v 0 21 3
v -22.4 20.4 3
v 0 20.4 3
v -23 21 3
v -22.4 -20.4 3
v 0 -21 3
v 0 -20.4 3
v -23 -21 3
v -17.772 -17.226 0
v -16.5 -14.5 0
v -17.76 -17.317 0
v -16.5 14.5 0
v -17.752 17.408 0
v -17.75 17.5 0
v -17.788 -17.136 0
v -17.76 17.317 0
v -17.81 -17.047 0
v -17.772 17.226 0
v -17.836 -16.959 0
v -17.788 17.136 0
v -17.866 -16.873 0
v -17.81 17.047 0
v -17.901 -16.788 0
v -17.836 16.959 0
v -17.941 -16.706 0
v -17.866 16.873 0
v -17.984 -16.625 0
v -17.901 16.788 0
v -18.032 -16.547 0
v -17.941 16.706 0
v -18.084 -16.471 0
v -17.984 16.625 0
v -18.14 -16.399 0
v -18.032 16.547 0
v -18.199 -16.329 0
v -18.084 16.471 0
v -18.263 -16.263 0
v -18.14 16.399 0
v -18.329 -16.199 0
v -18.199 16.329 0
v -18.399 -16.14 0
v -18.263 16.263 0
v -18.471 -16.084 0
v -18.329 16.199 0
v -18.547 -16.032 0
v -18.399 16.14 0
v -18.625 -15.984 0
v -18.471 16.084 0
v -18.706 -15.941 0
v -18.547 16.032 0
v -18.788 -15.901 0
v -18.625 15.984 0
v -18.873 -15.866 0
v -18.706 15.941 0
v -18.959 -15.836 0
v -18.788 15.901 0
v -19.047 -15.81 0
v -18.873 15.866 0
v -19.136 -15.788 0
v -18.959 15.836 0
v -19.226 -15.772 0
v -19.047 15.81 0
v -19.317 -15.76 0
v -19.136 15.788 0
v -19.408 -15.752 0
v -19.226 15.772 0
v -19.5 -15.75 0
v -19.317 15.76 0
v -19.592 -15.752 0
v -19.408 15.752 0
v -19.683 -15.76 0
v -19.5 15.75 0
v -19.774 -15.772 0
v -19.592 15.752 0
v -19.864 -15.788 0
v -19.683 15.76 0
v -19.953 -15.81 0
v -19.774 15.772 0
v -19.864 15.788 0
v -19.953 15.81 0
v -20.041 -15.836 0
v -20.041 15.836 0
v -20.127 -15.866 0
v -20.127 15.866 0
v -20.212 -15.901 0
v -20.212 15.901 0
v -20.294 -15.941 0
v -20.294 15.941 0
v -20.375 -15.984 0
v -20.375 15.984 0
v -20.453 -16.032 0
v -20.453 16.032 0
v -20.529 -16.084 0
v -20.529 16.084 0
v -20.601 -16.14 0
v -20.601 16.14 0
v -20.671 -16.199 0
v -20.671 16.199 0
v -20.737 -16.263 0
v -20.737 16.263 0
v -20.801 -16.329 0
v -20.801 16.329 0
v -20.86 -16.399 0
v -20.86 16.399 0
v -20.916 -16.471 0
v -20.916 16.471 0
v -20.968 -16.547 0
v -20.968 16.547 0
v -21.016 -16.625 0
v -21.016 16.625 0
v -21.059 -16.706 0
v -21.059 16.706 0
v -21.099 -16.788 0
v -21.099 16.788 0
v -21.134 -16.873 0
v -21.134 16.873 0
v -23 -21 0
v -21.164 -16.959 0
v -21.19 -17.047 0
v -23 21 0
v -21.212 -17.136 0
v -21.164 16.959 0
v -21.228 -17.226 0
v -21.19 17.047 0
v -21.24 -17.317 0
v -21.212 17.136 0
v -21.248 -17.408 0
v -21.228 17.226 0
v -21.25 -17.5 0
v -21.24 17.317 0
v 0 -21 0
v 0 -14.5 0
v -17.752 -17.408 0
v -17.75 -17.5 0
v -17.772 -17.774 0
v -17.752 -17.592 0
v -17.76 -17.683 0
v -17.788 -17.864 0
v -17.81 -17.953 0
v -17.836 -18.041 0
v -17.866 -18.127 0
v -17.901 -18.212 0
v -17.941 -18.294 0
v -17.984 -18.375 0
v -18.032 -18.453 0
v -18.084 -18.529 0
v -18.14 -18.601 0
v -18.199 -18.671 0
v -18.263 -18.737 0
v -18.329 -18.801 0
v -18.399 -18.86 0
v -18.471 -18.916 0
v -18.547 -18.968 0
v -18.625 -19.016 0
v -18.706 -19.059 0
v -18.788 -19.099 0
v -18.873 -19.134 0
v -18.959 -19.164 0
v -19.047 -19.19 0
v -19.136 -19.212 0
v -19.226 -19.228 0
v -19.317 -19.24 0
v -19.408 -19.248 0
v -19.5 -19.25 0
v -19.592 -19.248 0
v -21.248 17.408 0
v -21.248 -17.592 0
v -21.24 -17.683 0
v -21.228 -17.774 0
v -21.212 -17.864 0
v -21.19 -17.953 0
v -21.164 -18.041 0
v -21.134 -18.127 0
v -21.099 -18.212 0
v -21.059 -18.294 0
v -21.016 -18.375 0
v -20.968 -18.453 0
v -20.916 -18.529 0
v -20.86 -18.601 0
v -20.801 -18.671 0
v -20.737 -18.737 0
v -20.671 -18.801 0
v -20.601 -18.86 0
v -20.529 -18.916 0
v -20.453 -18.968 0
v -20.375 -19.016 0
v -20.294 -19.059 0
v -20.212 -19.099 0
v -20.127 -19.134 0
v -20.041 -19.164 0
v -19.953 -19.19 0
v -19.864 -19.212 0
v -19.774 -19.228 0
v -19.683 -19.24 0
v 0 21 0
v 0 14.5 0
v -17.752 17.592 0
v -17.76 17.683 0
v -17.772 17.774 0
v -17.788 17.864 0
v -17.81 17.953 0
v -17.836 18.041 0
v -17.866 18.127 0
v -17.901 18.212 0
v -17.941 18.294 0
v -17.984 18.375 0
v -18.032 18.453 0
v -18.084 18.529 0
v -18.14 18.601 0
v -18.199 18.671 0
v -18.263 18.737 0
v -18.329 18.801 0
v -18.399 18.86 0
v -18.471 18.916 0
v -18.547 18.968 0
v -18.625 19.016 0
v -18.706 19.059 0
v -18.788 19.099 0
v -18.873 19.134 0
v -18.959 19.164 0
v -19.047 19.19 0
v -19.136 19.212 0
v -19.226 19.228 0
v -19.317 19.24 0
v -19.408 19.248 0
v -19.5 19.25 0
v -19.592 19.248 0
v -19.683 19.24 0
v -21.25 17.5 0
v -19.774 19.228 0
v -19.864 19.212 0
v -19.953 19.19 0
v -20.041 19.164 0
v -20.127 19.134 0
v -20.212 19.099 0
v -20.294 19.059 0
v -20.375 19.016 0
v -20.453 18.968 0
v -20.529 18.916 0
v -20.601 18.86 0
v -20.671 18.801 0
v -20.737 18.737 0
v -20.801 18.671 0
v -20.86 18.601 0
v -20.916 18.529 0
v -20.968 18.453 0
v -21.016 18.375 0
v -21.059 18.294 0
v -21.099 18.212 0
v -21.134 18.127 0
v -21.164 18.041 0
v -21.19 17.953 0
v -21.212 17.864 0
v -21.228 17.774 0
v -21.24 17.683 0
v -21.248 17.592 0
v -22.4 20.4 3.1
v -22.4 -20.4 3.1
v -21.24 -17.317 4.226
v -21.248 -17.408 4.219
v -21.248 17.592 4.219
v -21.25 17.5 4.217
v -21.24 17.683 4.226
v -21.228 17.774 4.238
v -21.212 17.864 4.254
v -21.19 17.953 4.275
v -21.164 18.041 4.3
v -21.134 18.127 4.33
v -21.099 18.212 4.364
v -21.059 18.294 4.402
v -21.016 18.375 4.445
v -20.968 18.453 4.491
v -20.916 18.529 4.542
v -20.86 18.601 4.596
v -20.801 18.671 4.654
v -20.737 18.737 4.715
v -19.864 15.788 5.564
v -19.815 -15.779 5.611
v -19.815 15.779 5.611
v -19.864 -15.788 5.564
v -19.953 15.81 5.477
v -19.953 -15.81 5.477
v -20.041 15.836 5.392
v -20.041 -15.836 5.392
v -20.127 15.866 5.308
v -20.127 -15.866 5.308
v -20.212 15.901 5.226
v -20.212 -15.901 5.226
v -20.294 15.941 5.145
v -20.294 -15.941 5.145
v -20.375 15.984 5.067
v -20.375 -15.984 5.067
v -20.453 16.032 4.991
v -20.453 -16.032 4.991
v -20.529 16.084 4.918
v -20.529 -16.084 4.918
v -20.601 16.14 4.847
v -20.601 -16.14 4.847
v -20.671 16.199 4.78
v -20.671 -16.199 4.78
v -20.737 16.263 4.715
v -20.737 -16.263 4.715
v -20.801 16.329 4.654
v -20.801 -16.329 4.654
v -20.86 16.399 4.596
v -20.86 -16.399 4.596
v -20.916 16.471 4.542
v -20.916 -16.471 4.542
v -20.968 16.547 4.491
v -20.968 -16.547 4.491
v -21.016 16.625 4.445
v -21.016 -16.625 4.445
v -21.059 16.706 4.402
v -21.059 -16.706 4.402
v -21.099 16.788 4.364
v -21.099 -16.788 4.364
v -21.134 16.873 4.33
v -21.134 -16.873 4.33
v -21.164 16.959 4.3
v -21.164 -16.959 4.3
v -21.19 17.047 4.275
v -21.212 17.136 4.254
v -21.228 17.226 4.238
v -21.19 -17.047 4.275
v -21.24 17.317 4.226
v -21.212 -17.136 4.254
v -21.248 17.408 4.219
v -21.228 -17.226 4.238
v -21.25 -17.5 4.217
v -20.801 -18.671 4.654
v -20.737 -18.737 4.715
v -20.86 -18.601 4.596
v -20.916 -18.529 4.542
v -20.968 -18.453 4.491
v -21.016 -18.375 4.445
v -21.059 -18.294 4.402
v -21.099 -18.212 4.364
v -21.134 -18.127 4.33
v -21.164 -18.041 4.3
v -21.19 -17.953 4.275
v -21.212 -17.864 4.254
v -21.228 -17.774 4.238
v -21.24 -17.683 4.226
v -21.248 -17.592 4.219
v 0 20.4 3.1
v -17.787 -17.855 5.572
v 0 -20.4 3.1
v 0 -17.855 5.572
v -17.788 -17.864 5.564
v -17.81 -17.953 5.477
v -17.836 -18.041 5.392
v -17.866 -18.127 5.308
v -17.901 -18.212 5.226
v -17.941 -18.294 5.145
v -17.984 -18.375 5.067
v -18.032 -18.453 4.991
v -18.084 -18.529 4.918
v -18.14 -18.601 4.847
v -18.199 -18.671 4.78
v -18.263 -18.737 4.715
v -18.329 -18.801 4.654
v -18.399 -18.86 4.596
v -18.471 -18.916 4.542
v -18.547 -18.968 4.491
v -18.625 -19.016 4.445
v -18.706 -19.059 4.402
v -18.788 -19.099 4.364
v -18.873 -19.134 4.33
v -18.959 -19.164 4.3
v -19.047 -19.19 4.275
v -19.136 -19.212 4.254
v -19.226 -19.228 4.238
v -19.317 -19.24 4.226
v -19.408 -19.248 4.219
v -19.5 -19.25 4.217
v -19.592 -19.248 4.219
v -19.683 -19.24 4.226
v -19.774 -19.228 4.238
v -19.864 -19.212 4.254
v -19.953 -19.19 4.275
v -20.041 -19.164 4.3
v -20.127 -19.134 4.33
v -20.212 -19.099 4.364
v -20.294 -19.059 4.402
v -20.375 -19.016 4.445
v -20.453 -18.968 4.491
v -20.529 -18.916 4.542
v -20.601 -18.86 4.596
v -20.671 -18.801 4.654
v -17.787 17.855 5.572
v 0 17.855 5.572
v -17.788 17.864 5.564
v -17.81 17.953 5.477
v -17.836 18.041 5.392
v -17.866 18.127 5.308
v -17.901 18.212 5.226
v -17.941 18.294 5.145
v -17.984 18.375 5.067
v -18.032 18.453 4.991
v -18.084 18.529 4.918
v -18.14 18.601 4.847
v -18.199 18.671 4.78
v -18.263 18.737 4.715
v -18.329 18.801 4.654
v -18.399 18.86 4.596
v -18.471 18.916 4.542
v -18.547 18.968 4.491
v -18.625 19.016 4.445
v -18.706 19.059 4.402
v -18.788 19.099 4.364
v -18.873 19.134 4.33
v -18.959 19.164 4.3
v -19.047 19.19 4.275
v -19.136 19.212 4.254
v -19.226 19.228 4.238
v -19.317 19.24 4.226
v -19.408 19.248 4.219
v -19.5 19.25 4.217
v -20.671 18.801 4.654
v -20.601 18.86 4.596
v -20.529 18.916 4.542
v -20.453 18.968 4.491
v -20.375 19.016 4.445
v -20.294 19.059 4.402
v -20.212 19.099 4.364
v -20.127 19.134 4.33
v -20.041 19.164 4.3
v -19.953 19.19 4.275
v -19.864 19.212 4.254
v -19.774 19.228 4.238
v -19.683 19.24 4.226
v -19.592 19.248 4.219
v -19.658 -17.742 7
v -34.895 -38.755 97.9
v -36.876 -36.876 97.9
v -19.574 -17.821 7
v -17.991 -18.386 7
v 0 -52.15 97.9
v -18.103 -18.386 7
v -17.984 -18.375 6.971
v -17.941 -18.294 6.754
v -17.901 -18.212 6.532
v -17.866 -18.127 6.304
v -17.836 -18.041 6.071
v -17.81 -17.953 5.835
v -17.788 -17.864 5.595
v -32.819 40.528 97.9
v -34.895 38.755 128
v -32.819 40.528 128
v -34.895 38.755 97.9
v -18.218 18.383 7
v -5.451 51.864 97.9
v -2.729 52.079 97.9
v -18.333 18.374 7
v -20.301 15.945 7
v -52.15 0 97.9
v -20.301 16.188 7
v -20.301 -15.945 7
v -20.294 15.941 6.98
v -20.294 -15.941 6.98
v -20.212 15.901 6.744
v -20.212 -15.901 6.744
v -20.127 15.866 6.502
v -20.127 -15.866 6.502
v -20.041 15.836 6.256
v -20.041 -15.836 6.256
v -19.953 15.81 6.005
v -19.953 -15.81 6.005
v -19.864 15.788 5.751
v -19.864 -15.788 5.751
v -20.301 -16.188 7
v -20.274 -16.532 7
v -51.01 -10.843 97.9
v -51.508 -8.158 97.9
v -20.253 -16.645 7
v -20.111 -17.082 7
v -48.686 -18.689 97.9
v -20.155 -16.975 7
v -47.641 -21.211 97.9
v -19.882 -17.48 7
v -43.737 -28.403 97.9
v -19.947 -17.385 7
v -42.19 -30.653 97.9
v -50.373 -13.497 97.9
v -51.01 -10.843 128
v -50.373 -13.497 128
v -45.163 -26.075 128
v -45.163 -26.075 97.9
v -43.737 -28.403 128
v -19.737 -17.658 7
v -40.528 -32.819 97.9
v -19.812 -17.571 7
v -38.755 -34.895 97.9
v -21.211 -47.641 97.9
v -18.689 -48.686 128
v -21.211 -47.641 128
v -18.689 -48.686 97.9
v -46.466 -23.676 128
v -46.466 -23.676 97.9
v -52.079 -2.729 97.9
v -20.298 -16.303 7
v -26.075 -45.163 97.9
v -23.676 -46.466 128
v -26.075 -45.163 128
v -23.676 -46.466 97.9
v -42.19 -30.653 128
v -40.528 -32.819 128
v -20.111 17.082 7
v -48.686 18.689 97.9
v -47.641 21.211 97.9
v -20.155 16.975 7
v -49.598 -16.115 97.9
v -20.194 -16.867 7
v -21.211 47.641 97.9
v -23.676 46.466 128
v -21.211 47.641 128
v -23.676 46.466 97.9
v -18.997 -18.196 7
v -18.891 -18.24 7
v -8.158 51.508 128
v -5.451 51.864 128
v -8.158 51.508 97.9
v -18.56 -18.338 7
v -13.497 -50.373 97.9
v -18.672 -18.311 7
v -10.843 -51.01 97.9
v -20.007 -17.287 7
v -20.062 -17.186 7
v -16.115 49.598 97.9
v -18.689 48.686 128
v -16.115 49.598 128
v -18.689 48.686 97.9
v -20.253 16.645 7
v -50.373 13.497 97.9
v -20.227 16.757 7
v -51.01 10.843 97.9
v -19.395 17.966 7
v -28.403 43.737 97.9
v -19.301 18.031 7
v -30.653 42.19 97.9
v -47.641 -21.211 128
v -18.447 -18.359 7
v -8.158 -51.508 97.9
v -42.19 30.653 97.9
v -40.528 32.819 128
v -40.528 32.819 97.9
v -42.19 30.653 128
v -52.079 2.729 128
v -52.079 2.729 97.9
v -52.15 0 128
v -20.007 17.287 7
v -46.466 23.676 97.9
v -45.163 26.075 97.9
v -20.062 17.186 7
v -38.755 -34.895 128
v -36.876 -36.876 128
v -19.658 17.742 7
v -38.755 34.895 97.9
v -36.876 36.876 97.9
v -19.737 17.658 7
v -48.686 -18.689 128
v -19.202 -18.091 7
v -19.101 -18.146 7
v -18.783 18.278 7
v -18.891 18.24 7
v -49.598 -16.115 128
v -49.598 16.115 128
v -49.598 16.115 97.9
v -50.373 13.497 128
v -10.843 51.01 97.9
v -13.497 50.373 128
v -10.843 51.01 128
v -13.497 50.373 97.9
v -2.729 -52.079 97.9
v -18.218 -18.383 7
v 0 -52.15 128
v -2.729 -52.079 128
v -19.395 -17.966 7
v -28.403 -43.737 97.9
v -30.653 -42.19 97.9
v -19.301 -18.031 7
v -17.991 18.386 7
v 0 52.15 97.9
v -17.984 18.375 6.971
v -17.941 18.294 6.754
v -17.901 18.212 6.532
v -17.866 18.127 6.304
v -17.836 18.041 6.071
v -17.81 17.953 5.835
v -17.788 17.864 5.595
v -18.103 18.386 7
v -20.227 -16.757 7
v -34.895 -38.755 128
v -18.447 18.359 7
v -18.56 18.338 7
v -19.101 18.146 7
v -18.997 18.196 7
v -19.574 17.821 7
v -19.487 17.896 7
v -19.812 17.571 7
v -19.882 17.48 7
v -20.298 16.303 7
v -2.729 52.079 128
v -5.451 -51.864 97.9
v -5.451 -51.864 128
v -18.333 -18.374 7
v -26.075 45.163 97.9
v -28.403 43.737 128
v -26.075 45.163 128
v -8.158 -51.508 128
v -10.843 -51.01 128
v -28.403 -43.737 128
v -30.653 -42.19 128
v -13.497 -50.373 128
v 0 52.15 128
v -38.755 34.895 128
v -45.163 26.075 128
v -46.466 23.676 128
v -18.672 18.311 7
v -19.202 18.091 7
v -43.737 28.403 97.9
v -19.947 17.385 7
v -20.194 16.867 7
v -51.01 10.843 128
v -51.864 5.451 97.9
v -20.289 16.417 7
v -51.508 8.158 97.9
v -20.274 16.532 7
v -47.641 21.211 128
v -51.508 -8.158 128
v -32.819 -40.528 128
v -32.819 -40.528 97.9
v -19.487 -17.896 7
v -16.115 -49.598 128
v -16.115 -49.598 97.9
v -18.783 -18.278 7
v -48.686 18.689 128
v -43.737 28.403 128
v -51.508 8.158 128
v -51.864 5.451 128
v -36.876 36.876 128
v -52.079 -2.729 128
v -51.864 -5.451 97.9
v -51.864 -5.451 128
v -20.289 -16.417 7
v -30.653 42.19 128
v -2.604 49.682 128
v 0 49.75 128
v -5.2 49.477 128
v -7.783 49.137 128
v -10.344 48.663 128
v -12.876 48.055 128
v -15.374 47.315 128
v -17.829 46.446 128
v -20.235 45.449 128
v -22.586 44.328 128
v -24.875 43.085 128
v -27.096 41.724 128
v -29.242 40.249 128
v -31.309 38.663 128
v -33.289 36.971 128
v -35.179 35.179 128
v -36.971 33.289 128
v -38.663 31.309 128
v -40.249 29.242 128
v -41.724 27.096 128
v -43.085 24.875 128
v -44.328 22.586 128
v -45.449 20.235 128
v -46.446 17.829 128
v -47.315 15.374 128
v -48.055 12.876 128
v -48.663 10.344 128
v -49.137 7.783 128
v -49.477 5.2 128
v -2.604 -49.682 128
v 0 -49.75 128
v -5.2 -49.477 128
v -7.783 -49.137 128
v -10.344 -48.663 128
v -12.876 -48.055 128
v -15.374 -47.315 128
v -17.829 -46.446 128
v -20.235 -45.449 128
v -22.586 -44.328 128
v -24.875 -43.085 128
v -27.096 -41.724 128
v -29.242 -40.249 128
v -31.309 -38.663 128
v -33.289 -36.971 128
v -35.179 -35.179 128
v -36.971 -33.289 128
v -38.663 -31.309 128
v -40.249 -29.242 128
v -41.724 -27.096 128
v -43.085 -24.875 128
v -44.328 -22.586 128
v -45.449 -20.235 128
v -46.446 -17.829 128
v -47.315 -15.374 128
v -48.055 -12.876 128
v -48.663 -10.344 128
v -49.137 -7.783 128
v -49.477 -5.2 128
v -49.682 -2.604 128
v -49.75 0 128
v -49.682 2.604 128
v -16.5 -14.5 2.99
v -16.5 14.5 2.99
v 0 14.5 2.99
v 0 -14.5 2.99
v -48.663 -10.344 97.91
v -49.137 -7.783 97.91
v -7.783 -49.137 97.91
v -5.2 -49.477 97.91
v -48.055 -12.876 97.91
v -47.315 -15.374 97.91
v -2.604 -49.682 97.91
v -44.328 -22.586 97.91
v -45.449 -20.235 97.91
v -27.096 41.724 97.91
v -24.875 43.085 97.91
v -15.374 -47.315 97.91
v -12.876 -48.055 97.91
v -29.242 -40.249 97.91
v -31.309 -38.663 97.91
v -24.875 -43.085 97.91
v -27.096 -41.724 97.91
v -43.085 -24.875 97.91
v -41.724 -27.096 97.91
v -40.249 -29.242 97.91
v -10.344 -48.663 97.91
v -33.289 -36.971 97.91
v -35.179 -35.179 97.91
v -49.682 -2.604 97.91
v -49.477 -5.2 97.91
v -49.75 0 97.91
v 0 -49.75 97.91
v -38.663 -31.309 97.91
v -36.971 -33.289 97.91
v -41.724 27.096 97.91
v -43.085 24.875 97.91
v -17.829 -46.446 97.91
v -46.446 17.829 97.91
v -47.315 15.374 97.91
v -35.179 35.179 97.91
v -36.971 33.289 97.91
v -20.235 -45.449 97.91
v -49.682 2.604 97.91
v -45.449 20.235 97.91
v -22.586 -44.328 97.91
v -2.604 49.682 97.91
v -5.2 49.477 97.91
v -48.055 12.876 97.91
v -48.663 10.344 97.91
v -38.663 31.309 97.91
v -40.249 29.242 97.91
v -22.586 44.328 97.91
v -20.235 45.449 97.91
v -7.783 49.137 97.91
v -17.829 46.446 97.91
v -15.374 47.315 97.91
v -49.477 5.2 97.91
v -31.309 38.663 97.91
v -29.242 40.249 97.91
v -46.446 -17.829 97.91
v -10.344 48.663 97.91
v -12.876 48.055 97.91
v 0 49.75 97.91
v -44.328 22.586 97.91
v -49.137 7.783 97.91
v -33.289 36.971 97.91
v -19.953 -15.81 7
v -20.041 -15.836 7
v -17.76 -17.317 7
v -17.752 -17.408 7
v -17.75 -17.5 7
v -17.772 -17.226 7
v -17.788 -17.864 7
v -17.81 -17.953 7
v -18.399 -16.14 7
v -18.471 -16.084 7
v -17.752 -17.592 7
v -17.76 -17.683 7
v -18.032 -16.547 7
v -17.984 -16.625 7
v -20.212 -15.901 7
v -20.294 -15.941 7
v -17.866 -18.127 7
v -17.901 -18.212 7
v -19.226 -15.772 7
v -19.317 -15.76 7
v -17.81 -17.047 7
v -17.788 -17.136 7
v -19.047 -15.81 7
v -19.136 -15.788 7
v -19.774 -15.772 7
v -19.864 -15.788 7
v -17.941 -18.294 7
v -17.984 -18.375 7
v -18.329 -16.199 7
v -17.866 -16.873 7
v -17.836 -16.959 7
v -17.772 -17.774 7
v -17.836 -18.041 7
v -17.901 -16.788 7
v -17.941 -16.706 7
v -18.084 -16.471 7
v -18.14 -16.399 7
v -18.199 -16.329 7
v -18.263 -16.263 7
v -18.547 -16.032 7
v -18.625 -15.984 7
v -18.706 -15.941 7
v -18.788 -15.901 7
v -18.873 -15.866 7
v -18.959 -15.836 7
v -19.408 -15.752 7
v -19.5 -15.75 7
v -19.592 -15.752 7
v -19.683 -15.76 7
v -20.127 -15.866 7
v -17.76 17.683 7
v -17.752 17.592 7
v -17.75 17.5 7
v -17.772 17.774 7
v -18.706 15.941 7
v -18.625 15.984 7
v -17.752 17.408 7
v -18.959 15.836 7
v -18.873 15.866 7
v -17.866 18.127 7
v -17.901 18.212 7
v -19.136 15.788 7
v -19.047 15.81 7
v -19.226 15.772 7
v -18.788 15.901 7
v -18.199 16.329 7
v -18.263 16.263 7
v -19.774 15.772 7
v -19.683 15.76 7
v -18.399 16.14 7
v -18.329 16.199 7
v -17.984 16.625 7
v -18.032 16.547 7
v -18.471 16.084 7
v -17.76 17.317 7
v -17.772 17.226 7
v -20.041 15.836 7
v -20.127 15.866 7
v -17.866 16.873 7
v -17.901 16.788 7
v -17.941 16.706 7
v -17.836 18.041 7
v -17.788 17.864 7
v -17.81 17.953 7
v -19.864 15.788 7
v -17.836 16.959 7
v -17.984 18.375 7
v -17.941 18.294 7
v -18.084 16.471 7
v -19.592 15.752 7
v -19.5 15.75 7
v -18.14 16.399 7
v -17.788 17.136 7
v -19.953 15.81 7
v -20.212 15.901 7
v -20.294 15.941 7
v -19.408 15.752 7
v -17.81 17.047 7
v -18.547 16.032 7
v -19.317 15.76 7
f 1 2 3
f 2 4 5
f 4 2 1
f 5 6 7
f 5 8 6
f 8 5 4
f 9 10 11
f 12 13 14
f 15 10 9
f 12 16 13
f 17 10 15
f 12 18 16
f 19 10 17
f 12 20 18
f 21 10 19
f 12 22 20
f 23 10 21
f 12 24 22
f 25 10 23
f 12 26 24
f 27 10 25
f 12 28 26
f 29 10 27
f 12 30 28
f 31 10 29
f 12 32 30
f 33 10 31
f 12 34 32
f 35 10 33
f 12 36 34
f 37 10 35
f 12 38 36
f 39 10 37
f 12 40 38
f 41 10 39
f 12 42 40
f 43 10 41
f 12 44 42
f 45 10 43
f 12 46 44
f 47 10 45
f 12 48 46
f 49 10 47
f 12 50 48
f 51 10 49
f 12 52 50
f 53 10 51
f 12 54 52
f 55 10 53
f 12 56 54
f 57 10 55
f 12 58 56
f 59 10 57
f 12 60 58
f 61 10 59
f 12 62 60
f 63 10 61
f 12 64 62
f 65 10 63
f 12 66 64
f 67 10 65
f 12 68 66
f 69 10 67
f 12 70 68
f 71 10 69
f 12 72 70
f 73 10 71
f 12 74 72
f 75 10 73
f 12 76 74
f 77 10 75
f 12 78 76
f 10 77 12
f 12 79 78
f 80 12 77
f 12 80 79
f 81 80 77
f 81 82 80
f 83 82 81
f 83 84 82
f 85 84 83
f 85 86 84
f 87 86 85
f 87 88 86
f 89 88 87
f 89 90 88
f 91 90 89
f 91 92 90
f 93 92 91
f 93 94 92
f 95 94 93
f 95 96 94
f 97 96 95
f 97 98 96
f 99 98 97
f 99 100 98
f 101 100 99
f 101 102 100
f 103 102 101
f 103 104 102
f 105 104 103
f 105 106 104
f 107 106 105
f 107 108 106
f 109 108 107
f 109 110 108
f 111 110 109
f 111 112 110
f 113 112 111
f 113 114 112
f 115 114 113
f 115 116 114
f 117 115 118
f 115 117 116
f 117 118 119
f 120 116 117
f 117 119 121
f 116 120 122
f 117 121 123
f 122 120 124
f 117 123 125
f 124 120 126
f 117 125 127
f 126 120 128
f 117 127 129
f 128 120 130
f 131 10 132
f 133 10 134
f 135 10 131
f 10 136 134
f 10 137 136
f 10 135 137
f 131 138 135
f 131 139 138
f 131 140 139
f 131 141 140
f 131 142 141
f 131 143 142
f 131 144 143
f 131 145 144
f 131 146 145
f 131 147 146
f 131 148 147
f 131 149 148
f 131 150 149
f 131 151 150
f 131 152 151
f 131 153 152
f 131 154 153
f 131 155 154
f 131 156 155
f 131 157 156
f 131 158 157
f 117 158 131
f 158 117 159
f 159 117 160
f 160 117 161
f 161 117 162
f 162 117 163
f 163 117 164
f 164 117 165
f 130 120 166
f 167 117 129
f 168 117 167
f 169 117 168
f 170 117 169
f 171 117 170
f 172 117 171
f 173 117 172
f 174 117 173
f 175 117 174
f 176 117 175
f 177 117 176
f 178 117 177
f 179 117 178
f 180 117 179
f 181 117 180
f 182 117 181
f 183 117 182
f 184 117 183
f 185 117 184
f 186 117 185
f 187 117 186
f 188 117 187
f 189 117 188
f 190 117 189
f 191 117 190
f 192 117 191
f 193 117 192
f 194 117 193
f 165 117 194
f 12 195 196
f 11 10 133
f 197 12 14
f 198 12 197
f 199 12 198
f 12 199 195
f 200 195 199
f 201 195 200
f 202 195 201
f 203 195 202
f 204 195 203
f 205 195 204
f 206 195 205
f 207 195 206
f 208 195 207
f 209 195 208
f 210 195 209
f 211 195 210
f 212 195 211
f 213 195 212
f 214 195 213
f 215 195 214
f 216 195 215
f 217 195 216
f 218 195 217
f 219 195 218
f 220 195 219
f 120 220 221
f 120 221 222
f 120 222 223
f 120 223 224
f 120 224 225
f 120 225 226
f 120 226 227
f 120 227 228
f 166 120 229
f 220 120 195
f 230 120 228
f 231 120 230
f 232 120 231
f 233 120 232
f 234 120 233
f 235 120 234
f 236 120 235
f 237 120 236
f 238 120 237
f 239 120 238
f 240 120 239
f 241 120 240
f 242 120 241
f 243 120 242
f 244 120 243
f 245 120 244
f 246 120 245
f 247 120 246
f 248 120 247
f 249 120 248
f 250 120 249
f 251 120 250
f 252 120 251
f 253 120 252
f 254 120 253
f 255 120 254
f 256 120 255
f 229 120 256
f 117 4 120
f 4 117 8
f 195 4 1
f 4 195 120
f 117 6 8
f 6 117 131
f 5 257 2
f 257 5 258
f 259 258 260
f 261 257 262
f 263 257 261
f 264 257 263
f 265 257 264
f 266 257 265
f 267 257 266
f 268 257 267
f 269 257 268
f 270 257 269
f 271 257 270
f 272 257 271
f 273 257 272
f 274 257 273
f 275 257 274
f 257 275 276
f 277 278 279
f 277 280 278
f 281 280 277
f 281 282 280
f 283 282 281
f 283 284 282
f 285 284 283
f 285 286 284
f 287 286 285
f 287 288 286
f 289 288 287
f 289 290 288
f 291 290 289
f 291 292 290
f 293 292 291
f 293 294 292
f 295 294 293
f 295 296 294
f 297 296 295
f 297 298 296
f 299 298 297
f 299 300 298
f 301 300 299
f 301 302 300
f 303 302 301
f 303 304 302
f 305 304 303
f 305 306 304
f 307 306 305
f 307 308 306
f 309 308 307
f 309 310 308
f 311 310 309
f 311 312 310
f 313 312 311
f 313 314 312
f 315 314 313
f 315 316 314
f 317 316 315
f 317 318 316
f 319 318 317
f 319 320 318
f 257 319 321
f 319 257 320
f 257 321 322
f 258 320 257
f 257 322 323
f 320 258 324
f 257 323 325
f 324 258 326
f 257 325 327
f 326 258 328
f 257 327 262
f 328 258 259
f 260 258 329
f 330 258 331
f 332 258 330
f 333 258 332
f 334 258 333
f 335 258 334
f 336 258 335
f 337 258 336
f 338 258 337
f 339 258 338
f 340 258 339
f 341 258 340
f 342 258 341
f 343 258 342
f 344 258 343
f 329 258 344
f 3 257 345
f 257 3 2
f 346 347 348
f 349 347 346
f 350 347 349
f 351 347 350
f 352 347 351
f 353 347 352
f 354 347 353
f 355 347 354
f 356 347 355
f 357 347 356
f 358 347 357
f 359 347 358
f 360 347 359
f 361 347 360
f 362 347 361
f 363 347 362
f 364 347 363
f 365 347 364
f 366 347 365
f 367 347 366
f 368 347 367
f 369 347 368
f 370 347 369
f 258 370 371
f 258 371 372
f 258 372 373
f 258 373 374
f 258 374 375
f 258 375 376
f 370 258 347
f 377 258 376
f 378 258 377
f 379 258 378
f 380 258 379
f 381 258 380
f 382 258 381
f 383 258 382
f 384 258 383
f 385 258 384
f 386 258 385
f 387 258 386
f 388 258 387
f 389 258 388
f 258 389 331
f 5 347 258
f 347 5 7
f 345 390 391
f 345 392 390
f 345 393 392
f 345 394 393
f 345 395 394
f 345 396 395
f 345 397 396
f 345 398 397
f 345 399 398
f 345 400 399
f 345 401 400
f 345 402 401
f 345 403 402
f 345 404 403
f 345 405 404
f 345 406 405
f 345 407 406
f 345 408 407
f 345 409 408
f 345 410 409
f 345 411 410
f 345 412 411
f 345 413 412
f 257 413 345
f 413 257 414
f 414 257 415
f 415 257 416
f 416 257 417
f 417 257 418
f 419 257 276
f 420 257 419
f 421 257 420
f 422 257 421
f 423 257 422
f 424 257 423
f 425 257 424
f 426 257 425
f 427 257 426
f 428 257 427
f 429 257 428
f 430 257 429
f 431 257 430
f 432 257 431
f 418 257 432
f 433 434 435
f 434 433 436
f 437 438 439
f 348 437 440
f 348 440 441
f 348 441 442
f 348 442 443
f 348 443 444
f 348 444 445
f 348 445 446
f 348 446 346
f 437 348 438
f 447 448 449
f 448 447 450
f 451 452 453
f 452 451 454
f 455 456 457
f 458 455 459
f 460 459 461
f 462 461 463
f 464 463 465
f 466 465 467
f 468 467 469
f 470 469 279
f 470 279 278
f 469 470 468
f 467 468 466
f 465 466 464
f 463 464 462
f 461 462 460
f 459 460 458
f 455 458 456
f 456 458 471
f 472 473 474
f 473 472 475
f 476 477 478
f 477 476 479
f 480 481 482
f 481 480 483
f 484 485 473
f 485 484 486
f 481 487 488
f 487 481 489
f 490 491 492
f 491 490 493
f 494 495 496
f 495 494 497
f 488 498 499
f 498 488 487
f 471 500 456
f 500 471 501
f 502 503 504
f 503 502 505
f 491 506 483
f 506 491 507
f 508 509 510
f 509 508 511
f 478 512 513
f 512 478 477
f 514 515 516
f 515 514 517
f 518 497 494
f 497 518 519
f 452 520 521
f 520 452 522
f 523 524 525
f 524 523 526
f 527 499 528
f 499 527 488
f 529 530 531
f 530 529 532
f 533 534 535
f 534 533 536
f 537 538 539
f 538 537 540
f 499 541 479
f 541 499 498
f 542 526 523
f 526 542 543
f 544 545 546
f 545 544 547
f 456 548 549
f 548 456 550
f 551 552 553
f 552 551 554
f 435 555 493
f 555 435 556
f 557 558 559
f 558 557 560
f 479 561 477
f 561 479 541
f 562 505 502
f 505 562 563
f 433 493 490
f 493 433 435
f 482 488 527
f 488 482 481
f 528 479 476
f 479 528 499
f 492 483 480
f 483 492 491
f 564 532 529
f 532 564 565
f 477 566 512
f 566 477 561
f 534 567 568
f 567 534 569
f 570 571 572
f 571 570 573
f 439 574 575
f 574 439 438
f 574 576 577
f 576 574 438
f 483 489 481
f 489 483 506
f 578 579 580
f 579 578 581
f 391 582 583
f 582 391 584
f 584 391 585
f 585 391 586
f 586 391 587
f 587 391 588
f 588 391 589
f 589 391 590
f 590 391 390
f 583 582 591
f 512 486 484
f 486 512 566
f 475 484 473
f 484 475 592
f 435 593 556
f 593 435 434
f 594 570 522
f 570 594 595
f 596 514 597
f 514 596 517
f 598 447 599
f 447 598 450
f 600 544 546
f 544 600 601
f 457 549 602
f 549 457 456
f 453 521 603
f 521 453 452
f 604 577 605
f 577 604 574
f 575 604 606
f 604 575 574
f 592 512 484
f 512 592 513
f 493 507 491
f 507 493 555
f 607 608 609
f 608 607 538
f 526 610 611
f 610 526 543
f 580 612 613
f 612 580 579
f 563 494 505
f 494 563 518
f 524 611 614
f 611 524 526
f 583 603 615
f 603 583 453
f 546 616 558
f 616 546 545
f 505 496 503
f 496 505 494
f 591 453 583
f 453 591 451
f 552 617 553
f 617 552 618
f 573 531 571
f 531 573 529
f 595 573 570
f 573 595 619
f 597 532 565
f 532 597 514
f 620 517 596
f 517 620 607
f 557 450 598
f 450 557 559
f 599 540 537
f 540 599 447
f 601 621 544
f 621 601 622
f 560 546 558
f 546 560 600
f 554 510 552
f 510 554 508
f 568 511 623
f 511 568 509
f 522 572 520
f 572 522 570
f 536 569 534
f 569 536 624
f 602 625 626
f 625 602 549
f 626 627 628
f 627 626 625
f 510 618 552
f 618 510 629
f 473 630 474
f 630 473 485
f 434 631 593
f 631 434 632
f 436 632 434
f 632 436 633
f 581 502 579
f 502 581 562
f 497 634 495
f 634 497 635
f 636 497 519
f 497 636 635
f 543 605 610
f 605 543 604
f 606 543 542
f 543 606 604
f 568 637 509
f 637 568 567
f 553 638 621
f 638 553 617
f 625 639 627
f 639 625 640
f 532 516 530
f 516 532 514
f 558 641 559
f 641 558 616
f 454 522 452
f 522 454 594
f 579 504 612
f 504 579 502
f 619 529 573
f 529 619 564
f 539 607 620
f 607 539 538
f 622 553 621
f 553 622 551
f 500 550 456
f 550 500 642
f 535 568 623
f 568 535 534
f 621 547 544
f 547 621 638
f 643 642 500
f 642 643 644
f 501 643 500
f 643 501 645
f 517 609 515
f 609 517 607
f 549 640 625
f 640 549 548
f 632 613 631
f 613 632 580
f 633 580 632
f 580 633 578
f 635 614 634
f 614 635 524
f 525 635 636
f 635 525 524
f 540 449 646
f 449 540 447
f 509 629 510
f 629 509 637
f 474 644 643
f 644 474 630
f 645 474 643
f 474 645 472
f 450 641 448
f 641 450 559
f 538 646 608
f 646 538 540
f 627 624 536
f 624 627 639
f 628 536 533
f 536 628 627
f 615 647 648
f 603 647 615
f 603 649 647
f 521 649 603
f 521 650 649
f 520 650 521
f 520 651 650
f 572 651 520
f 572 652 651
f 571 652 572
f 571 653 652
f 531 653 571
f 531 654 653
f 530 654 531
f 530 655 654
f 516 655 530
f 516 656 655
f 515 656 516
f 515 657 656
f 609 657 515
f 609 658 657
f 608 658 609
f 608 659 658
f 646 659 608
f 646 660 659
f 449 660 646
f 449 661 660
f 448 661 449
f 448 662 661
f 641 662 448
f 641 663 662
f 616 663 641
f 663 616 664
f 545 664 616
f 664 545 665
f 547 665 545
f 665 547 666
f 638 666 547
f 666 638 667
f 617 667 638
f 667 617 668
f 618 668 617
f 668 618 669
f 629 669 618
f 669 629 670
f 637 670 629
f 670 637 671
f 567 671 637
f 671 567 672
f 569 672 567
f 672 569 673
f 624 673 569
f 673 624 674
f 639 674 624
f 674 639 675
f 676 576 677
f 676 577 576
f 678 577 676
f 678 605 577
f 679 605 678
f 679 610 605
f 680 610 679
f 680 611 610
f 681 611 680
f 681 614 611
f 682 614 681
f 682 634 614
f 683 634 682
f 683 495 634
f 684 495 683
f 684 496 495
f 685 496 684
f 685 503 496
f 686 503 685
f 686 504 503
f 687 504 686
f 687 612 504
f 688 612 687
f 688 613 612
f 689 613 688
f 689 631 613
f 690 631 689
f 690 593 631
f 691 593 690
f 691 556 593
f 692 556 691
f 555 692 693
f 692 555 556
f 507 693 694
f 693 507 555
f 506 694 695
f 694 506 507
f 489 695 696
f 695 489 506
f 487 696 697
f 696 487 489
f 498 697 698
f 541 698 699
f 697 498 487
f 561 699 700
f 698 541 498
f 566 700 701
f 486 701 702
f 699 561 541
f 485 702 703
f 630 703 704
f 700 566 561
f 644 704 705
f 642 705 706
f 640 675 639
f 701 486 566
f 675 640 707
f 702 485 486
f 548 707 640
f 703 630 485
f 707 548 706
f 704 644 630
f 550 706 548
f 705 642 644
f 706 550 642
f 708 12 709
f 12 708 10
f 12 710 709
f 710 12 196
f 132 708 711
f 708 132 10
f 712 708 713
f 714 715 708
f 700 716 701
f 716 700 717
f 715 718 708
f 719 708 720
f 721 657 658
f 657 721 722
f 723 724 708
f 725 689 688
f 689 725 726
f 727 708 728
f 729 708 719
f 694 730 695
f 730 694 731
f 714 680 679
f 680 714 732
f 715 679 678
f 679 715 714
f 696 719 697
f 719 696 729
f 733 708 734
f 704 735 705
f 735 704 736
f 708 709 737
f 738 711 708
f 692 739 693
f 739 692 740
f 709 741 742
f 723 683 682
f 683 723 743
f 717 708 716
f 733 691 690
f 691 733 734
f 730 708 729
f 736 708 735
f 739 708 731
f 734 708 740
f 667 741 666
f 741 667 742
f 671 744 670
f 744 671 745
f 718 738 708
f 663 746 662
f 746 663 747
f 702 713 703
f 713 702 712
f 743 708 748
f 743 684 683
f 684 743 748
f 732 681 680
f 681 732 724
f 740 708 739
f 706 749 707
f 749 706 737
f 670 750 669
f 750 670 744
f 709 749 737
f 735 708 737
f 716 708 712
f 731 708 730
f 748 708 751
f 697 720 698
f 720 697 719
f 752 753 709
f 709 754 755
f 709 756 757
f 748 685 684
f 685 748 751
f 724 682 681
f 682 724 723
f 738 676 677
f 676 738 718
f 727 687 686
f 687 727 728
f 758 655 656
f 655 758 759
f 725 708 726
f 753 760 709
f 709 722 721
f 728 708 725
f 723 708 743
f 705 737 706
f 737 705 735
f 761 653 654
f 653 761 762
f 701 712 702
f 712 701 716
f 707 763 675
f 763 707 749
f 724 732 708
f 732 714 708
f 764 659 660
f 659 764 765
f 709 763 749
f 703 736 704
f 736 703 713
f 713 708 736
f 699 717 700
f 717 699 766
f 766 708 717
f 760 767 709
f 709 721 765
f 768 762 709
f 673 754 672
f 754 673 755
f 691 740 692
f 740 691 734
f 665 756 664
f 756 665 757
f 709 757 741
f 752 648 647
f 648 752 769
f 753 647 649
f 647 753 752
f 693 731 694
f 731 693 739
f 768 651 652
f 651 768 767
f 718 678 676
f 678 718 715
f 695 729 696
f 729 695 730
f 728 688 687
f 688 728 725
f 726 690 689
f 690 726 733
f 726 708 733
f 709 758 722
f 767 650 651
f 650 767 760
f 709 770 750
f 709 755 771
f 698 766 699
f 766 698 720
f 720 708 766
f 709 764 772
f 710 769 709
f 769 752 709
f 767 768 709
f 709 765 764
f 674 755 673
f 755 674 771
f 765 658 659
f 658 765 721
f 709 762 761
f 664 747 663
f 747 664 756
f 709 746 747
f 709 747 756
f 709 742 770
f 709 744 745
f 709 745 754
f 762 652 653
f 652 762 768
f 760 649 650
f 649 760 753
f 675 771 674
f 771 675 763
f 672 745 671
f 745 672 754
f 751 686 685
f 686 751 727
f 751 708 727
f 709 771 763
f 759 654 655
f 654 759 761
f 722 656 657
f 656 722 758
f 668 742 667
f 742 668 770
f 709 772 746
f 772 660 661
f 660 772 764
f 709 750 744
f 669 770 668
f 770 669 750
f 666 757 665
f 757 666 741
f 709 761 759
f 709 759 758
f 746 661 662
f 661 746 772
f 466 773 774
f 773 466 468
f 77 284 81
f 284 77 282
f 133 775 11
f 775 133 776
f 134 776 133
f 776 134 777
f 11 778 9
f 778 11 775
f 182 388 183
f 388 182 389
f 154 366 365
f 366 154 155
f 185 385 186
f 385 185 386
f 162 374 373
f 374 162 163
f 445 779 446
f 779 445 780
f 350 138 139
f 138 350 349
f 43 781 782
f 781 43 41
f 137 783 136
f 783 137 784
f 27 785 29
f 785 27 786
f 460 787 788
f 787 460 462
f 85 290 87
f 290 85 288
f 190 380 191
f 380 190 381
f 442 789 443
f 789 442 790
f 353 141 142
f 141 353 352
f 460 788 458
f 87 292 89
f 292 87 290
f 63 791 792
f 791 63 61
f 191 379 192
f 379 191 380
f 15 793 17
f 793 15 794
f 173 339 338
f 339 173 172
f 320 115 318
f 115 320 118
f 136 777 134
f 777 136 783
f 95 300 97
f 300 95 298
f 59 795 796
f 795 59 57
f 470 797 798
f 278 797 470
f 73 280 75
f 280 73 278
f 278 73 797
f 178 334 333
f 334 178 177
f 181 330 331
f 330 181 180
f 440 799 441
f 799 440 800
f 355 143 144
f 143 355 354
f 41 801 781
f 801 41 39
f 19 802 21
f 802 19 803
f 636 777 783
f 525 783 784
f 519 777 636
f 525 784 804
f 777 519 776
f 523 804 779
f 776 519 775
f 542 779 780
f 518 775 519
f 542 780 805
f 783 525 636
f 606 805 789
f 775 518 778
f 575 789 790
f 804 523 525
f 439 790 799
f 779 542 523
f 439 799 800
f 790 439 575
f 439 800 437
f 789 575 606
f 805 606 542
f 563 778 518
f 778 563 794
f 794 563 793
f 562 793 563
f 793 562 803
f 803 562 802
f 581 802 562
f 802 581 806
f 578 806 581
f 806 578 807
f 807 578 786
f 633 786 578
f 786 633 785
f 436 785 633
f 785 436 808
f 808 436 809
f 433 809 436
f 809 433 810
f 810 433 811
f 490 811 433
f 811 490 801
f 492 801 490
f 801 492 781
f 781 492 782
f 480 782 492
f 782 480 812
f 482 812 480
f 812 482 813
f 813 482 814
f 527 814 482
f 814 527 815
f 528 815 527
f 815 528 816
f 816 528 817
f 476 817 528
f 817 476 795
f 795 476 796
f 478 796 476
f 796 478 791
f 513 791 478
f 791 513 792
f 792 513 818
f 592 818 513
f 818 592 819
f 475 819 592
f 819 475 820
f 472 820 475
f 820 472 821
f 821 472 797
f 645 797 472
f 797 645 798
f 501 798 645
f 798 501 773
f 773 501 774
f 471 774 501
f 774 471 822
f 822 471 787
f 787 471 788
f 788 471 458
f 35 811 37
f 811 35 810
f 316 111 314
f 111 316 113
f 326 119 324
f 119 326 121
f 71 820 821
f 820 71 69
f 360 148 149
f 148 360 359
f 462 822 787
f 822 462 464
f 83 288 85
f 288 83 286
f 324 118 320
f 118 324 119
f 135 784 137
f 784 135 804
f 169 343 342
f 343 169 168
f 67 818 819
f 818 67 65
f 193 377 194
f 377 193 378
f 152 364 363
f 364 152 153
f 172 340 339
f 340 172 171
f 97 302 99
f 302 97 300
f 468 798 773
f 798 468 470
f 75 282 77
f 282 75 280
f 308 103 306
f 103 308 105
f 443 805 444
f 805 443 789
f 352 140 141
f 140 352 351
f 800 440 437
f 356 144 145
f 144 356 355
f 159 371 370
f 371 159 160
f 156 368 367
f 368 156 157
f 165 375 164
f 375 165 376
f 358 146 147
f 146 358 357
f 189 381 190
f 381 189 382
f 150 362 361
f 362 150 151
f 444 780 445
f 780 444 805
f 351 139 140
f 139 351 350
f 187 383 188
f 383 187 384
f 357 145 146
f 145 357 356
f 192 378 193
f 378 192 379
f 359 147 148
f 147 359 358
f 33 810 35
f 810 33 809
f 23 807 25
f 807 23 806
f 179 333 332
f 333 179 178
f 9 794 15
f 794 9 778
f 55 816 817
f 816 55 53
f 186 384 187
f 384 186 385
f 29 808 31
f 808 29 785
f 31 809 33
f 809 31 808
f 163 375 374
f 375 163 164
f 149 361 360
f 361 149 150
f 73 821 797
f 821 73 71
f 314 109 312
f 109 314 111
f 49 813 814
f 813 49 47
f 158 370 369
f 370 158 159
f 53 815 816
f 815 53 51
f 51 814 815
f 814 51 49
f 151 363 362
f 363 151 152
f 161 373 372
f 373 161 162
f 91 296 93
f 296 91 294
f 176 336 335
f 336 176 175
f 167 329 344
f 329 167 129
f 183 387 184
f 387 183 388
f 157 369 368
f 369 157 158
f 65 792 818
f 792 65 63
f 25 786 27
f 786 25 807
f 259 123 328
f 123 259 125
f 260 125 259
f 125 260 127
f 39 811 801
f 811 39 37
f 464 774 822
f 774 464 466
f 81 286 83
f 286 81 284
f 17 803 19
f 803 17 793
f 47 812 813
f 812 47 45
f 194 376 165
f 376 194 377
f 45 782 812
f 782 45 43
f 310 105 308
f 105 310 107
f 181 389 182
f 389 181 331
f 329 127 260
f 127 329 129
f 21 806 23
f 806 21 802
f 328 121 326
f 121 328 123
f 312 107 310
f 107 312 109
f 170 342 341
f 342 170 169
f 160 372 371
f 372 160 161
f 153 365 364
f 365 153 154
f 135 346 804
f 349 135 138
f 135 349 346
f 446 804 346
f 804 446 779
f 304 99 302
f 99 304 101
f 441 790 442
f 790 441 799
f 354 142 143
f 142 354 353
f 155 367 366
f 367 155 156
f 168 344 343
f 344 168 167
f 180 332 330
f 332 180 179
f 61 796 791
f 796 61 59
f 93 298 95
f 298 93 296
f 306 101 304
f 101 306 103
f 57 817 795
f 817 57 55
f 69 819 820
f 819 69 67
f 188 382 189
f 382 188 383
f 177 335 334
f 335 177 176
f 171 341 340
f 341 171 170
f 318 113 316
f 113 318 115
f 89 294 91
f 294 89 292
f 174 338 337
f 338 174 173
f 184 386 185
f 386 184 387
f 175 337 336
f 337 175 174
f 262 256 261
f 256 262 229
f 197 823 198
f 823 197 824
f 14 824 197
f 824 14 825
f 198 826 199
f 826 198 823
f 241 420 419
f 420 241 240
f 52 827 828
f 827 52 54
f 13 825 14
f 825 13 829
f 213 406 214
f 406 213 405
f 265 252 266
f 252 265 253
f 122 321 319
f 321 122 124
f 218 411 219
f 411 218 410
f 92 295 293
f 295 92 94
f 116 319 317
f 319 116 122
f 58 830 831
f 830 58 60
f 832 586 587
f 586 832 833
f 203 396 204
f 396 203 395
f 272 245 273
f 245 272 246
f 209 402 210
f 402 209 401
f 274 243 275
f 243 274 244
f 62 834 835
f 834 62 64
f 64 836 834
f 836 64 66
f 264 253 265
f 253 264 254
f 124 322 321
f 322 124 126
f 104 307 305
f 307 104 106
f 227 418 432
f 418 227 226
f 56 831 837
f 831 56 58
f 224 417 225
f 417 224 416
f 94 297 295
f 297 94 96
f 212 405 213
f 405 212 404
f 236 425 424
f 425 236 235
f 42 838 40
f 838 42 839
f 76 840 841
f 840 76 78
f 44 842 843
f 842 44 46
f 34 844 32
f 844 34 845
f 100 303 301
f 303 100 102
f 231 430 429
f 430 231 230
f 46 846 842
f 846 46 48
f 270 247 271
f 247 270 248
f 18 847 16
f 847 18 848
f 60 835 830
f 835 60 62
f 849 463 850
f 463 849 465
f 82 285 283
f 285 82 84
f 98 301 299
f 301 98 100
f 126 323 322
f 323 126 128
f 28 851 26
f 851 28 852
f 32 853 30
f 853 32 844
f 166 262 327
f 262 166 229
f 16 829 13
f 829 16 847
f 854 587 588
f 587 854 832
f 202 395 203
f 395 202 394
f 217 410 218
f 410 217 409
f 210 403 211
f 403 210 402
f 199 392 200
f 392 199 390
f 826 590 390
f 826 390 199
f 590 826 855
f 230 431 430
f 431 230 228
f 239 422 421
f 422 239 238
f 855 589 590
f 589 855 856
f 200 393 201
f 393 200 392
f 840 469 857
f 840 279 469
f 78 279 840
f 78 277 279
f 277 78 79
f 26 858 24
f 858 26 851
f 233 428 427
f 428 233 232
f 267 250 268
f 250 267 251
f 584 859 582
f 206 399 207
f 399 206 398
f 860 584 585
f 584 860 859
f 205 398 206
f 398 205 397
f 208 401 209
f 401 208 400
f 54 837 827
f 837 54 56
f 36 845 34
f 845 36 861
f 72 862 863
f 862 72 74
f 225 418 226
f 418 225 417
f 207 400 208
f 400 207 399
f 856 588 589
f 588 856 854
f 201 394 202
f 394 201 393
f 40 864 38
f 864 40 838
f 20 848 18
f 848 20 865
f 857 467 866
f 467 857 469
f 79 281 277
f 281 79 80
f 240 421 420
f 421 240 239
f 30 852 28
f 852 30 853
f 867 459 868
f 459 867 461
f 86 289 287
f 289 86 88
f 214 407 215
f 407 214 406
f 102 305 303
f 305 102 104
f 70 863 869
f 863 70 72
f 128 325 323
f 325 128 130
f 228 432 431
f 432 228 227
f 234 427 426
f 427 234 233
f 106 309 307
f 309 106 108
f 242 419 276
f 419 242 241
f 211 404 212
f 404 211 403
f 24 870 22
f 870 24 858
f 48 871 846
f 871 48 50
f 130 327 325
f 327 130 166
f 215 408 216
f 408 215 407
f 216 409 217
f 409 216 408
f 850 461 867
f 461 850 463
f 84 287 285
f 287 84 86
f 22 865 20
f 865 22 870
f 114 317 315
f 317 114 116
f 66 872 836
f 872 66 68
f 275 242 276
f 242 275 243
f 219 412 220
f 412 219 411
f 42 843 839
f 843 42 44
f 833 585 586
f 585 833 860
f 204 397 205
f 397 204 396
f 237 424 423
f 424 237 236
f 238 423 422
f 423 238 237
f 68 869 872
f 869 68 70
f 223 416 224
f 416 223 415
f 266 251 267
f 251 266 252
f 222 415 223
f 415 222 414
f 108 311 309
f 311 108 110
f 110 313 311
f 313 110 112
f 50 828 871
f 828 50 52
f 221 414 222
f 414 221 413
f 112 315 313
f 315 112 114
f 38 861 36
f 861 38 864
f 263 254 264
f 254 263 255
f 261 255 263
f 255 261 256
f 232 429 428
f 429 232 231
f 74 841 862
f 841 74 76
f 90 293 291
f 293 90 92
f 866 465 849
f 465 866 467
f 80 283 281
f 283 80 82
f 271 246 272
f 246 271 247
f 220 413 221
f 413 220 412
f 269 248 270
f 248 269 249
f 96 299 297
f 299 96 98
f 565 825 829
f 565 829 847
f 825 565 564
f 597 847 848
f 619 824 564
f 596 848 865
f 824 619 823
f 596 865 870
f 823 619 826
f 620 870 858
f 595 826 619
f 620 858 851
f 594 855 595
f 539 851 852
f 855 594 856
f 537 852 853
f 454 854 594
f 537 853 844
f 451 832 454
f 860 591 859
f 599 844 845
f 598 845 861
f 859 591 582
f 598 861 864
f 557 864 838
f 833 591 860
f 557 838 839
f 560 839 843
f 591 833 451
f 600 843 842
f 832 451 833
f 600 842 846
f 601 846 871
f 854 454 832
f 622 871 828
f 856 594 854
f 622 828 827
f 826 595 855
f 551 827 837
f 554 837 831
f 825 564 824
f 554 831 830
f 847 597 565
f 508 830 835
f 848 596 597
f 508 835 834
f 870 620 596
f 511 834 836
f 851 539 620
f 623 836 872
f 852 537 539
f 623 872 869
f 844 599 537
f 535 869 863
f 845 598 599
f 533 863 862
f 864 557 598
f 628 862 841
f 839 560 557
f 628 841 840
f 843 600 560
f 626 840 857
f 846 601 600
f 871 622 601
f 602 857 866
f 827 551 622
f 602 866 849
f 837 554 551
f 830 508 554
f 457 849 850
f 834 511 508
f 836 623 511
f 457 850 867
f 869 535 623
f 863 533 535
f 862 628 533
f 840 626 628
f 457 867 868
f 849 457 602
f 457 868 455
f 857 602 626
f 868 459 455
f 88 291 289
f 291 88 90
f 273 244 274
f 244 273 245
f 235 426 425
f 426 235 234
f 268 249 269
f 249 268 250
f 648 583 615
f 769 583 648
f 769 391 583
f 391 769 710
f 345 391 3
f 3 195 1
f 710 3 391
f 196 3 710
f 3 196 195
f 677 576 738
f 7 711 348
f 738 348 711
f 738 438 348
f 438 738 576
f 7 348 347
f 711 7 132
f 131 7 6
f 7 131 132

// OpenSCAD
// --- NEW PARAMETERS FOR 9733 BLOWER ---
$fn = 120; 

// Wall Thickness
wall = 2.4; 

// Fillet Reinforcement Size
fillet_size = 3.5; 

// GDSTIME 9733 Blower Port (Internal Dimensions)
blower_w = 33.0; // The 9733 is thinner (33mm wide)
blower_h = 29.0; // Port height opening

// Blower Mounting Flange (Angled mounting ears variant)
flange_w = 46.0;
flange_h = 42.0;
flange_thick = 3.0;
hole_spacing_x = 39.0; // Screw hole horizontal spacing
hole_spacing_y = 35.0; 
hole_dia = 3.5;        

// Transition Plenum
plenum_len = 95.0; 

// Stovepipe Port 
pipe_id = 99.5; 
pipe_len = 30.0; 

module duct(){
  // --- MAIN ASSEMBLY ---
  difference() {
      union() {
          // 1. Blower Flange Plate
          translate([-flange_w/2, -flange_h/2, 0])
              cube([flange_w, flange_h, flange_thick]);
              
          // 2. Added Structural Fillet (Reinforced Root Transition)
          translate([0, 0, flange_thick])
              cylinder_to_rectangle_loft(
                  blower_w + 2*wall + 2*fillet_size, 
                  blower_h + 2*wall + 2*fillet_size, 
                  blower_w + 2*wall, 
                  blower_h + 2*wall,
                  fillet_size
              );
          
          // 3. Outer Loft (Plenum Body)
          translate([0, 0, flange_thick])
              cylinder_to_rectangle_loft(blower_w + 2*wall, blower_h + 2*wall, pipe_id + 2*wall, 0, plenum_len);
          
          // 4. Outer Stovepipe Cuff
          translate([0, 0, flange_thick + plenum_len])
              cylinder(d = pipe_id + 2*wall, h = pipe_len);
      }
      
      // --- HOLLOW CUTOUTS ---
      union() {
          // 1. Internal Rectangular Airway Pass
          translate([-blower_w/2, -blower_h/2, -1])
              cube([blower_w, blower_h, flange_thick + 2]);
          
          // 2. Internal Loft Airway Pass
          translate([0, 0, flange_thick - 0.01])
              cylinder_to_rectangle_loft(blower_w, blower_h, pipe_id, 0, plenum_len + 0.02);
              
          // 3. Internal Pipe Core Pass
          translate([0, 0, flange_thick + plenum_len])
              cylinder(d = pipe_id, h = pipe_len + 1);
              
          // 4. Screw Mounting Holes through Flange
          translate([-hole_spacing_x/2, -hole_spacing_y/2, -1]) cylinder(d=hole_dia, h=2*flange_thick+2);
          translate([hole_spacing_x/2, -hole_spacing_y/2, -1])  cylinder(d=hole_dia, h=2*flange_thick+2);
          translate([-hole_spacing_x/2, hole_spacing_y/2, -1])  cylinder(d=hole_dia, h=2*flange_thick+2);
          translate([hole_spacing_x/2, hole_spacing_y/2, -1])   cylinder(d=hole_dia, h=2*flange_thick+2);
      }
  }
}

// --- HELPER MODULE FOR LOFTING ---
// Supports pure rectangle-to-cylinder transitions or custom base-to-top rectangle lofts
module cylinder_to_rectangle_loft(rect_w, rect_h, top_w_or_d, top_h_zero_if_cyl, height) {
    hull() {
        // Bottom Rectangle interface
        translate([-rect_w/2, -rect_h/2, 0])
            cube([rect_w, rect_h, 0.1]);
        
        // Top interface (determines if transitioning to a cylinder or a smaller rectangle)
        translate([0, 0, height - 0.1]) {
            if (top_h_zero_if_cyl == 0) {
                cylinder(d = top_w_or_d, h = 0.1);
            } else {
                translate([-top_w_or_d/2, -top_h_zero_if_cyl/2, 0])
                    cube([top_w_or_d, top_h_zero_if_cyl, 0.1]);
            }
        }
    }
}

//======================================================================

difference(){
  duct();
  translate([100,0,200])
  cube([200,200,400],center=true);
}

//======================================================================
